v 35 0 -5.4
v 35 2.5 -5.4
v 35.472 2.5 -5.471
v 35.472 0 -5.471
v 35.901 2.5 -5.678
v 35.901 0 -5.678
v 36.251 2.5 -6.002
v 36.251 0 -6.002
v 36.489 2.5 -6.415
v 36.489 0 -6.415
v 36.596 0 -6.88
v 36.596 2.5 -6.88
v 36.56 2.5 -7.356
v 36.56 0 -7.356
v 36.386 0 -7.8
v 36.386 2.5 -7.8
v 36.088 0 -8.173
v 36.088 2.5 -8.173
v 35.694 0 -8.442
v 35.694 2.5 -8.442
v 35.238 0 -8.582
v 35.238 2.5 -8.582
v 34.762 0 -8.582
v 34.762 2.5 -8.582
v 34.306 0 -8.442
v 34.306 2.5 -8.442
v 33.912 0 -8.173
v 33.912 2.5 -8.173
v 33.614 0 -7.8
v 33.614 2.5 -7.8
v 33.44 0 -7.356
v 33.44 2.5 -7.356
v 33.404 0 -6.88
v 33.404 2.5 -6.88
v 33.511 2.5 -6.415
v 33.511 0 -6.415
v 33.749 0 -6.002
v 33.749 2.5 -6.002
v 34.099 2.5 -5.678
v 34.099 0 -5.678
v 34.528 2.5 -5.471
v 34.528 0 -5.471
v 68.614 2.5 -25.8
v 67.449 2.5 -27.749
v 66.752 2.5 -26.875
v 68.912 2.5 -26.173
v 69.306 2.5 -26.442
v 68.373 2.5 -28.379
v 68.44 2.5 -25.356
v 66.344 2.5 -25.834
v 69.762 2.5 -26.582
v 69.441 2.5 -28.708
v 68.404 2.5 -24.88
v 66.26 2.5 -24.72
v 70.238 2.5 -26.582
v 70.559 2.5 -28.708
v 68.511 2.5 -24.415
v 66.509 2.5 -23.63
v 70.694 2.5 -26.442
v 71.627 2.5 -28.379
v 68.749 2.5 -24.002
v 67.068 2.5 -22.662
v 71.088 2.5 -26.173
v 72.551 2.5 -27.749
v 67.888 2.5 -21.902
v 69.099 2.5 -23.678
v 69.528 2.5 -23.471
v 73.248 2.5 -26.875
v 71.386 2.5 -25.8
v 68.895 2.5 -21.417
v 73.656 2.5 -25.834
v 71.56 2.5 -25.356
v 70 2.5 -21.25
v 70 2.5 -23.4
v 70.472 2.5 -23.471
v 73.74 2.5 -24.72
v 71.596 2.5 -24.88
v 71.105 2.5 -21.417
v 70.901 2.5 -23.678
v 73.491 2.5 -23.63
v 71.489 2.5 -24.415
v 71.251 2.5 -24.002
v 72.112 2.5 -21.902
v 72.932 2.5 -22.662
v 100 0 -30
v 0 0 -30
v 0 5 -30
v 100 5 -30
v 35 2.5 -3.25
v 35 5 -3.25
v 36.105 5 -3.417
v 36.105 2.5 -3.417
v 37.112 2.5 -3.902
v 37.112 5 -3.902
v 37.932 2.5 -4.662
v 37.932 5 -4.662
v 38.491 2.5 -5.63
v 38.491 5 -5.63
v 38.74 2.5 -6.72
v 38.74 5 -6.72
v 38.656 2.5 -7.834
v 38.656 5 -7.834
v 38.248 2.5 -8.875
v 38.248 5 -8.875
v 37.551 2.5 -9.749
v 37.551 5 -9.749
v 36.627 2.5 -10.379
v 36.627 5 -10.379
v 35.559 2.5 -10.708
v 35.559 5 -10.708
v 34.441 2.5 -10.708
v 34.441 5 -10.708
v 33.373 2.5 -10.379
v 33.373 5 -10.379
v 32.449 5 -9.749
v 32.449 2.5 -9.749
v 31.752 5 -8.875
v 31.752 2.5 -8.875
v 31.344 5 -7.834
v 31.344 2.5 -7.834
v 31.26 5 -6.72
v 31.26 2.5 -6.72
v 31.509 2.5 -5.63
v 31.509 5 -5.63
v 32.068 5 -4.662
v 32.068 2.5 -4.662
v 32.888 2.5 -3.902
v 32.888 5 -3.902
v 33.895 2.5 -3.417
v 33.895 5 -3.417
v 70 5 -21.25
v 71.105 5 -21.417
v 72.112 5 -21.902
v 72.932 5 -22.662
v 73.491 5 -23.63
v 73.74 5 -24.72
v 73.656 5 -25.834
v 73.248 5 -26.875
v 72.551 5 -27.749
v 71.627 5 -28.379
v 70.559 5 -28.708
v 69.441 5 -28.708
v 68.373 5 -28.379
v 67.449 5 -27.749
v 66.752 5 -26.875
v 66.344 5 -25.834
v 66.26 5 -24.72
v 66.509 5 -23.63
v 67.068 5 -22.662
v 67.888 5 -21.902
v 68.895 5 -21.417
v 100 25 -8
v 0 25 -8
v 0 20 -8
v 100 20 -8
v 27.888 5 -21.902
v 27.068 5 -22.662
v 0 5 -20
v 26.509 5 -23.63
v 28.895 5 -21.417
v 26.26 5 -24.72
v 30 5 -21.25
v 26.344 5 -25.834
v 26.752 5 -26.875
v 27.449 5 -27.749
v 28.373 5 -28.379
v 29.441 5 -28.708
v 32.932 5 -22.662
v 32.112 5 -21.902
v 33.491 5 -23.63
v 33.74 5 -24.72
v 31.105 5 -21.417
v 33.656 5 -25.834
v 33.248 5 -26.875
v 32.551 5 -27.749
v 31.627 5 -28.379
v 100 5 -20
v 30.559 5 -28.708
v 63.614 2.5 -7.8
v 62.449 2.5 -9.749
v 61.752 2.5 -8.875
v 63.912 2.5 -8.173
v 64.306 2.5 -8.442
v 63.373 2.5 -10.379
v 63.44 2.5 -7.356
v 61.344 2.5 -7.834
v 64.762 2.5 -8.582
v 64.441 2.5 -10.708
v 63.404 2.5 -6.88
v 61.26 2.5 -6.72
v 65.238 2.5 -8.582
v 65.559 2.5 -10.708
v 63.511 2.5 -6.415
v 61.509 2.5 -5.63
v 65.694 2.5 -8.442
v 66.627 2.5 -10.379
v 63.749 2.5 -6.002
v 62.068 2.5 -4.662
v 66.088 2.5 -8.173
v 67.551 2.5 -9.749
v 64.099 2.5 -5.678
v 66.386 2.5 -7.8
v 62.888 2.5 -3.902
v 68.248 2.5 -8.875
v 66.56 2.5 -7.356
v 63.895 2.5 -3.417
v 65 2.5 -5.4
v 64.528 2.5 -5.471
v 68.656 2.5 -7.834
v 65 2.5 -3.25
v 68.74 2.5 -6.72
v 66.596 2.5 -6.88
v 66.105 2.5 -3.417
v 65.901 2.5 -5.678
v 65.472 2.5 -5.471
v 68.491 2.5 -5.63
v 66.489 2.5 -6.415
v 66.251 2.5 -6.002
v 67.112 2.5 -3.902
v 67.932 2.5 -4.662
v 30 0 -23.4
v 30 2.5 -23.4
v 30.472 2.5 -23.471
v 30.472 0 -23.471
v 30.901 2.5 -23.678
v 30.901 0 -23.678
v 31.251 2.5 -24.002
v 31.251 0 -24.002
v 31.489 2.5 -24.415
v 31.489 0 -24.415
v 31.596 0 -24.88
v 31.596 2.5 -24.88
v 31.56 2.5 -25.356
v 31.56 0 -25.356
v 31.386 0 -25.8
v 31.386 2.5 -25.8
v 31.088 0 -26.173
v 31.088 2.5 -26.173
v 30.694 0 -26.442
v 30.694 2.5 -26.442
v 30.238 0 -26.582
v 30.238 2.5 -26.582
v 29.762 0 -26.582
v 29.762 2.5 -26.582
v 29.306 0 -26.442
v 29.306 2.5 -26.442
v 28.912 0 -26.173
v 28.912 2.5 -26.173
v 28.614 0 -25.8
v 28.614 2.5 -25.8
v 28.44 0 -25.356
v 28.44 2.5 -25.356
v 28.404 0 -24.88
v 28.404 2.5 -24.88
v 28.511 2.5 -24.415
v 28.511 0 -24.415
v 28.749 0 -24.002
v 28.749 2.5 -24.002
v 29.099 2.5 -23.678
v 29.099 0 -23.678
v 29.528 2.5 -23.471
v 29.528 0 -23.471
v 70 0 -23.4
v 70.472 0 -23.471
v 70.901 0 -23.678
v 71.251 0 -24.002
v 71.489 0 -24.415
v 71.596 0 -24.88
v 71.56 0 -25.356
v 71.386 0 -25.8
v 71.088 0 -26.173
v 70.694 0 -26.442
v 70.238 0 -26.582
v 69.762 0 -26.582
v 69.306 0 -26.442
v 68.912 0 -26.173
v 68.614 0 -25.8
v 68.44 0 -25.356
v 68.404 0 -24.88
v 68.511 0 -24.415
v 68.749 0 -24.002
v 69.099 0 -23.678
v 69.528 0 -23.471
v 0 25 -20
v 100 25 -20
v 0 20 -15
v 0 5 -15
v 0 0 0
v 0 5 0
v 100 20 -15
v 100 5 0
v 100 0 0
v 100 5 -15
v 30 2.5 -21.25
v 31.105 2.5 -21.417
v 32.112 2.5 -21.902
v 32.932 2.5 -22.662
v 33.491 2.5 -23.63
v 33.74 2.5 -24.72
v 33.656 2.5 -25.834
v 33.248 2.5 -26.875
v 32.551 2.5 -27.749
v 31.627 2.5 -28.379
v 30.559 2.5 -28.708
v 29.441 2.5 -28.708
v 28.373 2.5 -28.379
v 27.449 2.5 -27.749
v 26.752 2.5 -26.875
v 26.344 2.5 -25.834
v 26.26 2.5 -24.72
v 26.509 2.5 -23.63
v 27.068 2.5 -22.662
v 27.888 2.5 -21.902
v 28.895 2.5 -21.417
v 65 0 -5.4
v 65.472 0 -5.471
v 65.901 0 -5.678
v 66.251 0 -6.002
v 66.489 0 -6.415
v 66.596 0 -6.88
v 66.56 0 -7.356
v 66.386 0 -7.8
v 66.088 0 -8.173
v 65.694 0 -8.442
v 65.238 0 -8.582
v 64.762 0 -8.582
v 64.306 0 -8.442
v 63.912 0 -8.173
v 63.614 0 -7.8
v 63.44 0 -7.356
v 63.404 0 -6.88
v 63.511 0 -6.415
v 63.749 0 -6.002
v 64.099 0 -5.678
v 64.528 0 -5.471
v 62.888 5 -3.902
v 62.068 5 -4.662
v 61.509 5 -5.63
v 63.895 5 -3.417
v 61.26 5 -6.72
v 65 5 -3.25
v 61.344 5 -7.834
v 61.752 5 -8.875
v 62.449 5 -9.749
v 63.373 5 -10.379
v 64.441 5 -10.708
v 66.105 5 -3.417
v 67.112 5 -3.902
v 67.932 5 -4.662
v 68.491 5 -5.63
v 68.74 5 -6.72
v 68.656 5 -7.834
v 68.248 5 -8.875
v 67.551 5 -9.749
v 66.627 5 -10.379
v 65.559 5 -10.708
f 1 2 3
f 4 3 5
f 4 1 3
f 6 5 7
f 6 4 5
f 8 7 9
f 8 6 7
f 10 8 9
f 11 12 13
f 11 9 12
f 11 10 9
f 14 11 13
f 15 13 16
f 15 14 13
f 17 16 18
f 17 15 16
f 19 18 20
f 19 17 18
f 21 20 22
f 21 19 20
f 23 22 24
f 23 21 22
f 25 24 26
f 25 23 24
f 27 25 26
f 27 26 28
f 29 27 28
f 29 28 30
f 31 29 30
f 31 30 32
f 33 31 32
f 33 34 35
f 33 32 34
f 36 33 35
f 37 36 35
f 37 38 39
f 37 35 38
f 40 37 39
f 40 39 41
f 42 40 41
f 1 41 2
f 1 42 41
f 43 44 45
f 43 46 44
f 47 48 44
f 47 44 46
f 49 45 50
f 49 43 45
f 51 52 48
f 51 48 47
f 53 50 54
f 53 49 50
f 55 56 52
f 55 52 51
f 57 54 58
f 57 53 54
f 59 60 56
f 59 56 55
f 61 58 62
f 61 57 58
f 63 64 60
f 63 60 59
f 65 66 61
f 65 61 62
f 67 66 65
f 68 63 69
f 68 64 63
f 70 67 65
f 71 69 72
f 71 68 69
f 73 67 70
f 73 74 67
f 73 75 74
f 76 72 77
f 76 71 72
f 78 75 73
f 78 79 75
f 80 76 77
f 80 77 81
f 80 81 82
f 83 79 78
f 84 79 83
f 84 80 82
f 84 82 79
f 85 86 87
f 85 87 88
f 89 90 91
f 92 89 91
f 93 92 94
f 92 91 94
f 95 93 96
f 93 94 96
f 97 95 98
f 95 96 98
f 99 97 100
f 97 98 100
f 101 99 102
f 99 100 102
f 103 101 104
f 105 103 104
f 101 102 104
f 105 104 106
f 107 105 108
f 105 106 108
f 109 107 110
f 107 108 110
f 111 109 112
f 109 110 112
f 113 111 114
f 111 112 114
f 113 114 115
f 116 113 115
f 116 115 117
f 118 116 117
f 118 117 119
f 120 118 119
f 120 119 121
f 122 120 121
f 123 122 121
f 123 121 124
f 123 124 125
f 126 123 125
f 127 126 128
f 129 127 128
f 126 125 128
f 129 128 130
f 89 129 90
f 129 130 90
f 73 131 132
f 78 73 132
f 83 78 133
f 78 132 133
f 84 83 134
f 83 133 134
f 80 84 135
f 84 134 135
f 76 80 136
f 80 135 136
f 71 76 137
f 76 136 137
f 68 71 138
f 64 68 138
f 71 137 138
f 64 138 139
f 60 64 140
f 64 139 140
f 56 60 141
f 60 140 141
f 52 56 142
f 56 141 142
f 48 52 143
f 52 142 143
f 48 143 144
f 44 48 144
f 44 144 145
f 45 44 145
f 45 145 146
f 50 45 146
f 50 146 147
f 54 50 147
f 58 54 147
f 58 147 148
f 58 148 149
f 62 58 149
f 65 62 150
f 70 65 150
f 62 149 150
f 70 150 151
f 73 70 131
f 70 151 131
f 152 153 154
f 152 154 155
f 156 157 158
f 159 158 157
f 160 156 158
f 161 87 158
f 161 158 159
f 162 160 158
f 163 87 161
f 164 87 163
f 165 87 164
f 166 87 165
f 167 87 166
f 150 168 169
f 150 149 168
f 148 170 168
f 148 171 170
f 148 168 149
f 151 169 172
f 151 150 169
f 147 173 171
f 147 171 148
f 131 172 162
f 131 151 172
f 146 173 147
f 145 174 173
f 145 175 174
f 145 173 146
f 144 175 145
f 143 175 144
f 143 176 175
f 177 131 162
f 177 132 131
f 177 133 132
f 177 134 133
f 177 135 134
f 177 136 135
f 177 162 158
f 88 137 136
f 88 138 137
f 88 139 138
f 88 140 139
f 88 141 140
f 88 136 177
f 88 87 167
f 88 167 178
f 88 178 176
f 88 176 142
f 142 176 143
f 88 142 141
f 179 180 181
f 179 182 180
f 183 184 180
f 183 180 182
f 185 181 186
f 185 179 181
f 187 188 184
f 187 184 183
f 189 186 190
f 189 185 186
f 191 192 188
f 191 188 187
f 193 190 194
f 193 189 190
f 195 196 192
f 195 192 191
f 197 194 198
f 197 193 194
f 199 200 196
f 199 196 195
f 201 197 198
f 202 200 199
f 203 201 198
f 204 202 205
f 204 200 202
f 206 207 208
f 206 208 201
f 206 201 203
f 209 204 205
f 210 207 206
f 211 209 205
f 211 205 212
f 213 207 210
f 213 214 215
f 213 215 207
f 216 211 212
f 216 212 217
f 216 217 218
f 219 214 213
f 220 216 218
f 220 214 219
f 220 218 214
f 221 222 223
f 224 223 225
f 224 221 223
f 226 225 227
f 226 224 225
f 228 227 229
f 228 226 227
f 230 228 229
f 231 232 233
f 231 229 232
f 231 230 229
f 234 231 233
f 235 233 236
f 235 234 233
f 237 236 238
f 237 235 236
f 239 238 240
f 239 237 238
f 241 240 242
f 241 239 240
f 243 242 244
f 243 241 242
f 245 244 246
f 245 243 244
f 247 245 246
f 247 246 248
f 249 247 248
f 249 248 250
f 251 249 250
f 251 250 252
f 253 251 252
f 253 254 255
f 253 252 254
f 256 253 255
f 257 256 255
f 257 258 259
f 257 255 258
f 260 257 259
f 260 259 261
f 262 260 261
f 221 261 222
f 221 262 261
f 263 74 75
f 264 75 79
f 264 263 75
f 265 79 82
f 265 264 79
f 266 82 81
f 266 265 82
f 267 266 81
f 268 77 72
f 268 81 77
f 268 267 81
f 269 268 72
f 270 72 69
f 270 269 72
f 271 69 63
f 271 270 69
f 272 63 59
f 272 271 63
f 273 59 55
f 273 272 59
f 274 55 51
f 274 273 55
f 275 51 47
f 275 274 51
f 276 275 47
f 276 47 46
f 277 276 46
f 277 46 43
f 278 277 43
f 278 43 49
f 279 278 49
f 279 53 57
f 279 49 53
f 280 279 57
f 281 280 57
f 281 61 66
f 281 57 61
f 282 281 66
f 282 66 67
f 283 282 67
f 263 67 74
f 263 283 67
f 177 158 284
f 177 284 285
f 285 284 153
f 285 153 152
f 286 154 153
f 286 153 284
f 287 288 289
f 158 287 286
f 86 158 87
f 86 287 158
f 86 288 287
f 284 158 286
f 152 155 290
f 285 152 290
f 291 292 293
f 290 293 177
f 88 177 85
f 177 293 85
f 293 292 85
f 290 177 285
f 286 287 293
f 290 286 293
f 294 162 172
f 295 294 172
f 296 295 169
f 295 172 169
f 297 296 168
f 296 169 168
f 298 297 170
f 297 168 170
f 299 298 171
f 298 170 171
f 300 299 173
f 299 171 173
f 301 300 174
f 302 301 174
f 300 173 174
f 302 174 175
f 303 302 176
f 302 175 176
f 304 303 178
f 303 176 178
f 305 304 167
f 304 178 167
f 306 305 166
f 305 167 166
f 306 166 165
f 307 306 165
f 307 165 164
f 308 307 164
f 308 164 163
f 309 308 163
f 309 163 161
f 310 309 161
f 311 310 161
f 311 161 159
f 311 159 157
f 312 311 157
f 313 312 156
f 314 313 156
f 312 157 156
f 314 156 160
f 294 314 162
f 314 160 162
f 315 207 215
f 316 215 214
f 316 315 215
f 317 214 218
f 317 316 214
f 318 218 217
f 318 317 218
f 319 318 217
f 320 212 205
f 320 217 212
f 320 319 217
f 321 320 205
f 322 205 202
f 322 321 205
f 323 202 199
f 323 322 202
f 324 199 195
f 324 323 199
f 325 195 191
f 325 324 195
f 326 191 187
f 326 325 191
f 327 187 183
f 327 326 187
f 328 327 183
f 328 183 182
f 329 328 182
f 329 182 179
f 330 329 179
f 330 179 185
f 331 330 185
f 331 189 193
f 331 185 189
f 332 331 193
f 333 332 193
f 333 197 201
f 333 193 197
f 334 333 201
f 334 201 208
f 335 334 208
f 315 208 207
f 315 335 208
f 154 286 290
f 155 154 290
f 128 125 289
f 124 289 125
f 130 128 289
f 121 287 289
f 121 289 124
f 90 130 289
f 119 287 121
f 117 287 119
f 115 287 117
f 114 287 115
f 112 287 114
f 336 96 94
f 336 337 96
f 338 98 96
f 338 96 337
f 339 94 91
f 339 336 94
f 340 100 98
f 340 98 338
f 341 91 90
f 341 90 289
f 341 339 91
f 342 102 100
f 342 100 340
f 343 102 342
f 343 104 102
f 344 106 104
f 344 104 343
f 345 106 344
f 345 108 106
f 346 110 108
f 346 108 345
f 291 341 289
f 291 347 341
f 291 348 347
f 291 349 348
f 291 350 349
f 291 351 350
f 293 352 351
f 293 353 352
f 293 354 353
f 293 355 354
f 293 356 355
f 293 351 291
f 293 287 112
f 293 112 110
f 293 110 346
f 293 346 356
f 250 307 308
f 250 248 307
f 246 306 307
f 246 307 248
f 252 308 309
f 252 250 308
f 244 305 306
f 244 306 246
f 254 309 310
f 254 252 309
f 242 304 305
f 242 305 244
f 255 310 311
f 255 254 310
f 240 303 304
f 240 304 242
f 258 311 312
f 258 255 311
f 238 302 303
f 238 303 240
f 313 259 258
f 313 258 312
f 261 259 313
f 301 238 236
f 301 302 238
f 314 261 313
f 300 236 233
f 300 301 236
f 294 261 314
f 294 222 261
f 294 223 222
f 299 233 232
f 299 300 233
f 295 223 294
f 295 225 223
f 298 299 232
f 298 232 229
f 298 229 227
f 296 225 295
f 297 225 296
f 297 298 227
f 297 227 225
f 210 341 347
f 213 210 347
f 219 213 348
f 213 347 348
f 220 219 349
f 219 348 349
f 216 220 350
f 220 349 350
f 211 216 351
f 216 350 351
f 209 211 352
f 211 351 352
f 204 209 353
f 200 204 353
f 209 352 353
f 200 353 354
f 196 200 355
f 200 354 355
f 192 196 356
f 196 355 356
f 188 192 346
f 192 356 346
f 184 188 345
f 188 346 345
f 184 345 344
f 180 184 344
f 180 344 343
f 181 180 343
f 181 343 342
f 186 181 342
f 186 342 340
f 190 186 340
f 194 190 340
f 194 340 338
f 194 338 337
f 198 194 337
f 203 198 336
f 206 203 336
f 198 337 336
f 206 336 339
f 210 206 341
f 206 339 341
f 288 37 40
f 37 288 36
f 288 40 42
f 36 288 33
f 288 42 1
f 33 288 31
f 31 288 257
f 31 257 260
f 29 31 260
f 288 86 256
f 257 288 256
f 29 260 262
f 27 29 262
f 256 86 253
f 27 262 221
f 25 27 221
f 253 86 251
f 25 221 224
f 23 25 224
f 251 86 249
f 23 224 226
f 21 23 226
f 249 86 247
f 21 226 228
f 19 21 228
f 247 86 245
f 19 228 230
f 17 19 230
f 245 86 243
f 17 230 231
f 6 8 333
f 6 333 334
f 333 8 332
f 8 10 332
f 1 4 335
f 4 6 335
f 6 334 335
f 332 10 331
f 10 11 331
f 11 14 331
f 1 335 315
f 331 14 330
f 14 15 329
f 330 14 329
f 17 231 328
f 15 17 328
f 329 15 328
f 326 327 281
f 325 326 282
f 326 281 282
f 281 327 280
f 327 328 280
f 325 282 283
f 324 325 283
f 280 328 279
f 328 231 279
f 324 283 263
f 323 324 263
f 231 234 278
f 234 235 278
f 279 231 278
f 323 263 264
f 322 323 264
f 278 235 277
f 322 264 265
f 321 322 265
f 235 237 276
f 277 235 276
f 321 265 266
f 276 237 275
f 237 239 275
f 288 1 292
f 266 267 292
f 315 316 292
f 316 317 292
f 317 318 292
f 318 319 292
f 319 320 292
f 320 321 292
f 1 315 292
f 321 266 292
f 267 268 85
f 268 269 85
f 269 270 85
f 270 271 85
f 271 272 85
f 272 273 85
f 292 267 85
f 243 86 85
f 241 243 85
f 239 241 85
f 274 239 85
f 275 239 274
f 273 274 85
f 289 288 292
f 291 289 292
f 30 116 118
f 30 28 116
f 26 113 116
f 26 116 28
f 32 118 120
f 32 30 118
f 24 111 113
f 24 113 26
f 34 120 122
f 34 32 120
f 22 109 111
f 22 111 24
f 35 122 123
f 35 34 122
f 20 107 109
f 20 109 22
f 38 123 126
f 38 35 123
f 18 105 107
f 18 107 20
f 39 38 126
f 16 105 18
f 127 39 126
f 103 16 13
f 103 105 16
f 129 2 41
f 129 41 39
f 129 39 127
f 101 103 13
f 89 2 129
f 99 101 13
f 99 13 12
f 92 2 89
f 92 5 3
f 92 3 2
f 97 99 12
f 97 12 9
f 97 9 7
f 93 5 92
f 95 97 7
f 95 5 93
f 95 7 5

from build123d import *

# Parameters (mm, degrees)
SKETCH1_W                    = 100
SKETCH1_H                    = 20
SKETCH1_R                    = 1.6
EXTRUDE_BASE_DEPTH           = 5
SKETCH2_W                    = 100
SKETCH2_H                    = 5
EXTRUDE_VERTICAL_CLAMP_DEPTH = 20
SKETCH3_W                    = 100
SKETCH3_H                    = 5
EXTRUDE_CLAMP_ROOF_DEPTH     = 7
SKETCH5_W                    = 100
SKETCH5_H                    = 10
SKETCH5_R                    = 1.6
BOSS_EXTRUDE4_DEPTH          = 5
SKETCH4_R                    = 3.75
CUT_EXTRUDE1_DEPTH           = 2.5


with BuildPart() as part:
    # Sketch1 → Extrude-Base (new body)
    with BuildSketch(Plane(origin=(0, 0, 0), x_dir=(1, 0, 0), z_dir=(0, 1, 0))):
        with Locations((50, 10)):
            Rectangle(SKETCH1_W, SKETCH1_H)
        with Locations(Location((35, 7, 0), (0, 0, 270))):
            Circle(SKETCH1_R, mode=Mode.SUBTRACT)
        with Locations(Location((65, 7, 0), (0, 0, 270))):
            Circle(SKETCH1_R, mode=Mode.SUBTRACT)
    extrude(amount=EXTRUDE_BASE_DEPTH)

    # Sketch2 → Extrude-Vertical clamp (add)
    with BuildSketch(Plane(origin=(0, 5, 0), x_dir=(1, 0, 0), z_dir=(0, 1, 0))):
        with Locations((50, 17.5)):
            Rectangle(SKETCH2_W, SKETCH2_H)
    extrude(amount=EXTRUDE_VERTICAL_CLAMP_DEPTH)

    # Sketch3 → Extrude-Clamp Roof (add)
    with BuildSketch(Plane.XY.offset(-15)):
        with Locations((50, 22.5)):
            Rectangle(SKETCH3_W, SKETCH3_H)
    extrude(amount=EXTRUDE_CLAMP_ROOF_DEPTH)

    # Sketch5 → Boss-Extrude4 (add)
    with BuildSketch(Plane(origin=(0, 0, 0), x_dir=(1, 0, 0), z_dir=(0, 1, 0))):
        with Locations((50, 25)):
            Rectangle(SKETCH5_W, SKETCH5_H)
        with Locations(Location((70, 25, 0), (0, 0, 270))):
            Circle(SKETCH5_R, mode=Mode.SUBTRACT)
        with Locations(Location((30, 25, 0), (0, 0, 270))):
            Circle(SKETCH5_R, mode=Mode.SUBTRACT)
    extrude(amount=BOSS_EXTRUDE4_DEPTH)

    # Sketch4 → Cut-Extrude1 (cut)
    with BuildSketch(Plane(origin=(0, 5, 0), x_dir=(1, 0, 0), z_dir=(0, 1, 0))):
        with Locations(Location((35, 7, 0), (0, 0, 270))):
            Circle(SKETCH4_R)
        with Locations(Location((65, 7, 0), (0, 0, 270))):
            Circle(SKETCH4_R)
        with Locations(Location((30, 25, 0), (0, 0, 270))):
            Circle(SKETCH4_R)
        with Locations(Location((70, 25, 0), (0, 0, 270))):
            Circle(SKETCH4_R)
    extrude(amount=-CUT_EXTRUDE1_DEPTH, mode=Mode.SUBTRACT)


solid = part.part
